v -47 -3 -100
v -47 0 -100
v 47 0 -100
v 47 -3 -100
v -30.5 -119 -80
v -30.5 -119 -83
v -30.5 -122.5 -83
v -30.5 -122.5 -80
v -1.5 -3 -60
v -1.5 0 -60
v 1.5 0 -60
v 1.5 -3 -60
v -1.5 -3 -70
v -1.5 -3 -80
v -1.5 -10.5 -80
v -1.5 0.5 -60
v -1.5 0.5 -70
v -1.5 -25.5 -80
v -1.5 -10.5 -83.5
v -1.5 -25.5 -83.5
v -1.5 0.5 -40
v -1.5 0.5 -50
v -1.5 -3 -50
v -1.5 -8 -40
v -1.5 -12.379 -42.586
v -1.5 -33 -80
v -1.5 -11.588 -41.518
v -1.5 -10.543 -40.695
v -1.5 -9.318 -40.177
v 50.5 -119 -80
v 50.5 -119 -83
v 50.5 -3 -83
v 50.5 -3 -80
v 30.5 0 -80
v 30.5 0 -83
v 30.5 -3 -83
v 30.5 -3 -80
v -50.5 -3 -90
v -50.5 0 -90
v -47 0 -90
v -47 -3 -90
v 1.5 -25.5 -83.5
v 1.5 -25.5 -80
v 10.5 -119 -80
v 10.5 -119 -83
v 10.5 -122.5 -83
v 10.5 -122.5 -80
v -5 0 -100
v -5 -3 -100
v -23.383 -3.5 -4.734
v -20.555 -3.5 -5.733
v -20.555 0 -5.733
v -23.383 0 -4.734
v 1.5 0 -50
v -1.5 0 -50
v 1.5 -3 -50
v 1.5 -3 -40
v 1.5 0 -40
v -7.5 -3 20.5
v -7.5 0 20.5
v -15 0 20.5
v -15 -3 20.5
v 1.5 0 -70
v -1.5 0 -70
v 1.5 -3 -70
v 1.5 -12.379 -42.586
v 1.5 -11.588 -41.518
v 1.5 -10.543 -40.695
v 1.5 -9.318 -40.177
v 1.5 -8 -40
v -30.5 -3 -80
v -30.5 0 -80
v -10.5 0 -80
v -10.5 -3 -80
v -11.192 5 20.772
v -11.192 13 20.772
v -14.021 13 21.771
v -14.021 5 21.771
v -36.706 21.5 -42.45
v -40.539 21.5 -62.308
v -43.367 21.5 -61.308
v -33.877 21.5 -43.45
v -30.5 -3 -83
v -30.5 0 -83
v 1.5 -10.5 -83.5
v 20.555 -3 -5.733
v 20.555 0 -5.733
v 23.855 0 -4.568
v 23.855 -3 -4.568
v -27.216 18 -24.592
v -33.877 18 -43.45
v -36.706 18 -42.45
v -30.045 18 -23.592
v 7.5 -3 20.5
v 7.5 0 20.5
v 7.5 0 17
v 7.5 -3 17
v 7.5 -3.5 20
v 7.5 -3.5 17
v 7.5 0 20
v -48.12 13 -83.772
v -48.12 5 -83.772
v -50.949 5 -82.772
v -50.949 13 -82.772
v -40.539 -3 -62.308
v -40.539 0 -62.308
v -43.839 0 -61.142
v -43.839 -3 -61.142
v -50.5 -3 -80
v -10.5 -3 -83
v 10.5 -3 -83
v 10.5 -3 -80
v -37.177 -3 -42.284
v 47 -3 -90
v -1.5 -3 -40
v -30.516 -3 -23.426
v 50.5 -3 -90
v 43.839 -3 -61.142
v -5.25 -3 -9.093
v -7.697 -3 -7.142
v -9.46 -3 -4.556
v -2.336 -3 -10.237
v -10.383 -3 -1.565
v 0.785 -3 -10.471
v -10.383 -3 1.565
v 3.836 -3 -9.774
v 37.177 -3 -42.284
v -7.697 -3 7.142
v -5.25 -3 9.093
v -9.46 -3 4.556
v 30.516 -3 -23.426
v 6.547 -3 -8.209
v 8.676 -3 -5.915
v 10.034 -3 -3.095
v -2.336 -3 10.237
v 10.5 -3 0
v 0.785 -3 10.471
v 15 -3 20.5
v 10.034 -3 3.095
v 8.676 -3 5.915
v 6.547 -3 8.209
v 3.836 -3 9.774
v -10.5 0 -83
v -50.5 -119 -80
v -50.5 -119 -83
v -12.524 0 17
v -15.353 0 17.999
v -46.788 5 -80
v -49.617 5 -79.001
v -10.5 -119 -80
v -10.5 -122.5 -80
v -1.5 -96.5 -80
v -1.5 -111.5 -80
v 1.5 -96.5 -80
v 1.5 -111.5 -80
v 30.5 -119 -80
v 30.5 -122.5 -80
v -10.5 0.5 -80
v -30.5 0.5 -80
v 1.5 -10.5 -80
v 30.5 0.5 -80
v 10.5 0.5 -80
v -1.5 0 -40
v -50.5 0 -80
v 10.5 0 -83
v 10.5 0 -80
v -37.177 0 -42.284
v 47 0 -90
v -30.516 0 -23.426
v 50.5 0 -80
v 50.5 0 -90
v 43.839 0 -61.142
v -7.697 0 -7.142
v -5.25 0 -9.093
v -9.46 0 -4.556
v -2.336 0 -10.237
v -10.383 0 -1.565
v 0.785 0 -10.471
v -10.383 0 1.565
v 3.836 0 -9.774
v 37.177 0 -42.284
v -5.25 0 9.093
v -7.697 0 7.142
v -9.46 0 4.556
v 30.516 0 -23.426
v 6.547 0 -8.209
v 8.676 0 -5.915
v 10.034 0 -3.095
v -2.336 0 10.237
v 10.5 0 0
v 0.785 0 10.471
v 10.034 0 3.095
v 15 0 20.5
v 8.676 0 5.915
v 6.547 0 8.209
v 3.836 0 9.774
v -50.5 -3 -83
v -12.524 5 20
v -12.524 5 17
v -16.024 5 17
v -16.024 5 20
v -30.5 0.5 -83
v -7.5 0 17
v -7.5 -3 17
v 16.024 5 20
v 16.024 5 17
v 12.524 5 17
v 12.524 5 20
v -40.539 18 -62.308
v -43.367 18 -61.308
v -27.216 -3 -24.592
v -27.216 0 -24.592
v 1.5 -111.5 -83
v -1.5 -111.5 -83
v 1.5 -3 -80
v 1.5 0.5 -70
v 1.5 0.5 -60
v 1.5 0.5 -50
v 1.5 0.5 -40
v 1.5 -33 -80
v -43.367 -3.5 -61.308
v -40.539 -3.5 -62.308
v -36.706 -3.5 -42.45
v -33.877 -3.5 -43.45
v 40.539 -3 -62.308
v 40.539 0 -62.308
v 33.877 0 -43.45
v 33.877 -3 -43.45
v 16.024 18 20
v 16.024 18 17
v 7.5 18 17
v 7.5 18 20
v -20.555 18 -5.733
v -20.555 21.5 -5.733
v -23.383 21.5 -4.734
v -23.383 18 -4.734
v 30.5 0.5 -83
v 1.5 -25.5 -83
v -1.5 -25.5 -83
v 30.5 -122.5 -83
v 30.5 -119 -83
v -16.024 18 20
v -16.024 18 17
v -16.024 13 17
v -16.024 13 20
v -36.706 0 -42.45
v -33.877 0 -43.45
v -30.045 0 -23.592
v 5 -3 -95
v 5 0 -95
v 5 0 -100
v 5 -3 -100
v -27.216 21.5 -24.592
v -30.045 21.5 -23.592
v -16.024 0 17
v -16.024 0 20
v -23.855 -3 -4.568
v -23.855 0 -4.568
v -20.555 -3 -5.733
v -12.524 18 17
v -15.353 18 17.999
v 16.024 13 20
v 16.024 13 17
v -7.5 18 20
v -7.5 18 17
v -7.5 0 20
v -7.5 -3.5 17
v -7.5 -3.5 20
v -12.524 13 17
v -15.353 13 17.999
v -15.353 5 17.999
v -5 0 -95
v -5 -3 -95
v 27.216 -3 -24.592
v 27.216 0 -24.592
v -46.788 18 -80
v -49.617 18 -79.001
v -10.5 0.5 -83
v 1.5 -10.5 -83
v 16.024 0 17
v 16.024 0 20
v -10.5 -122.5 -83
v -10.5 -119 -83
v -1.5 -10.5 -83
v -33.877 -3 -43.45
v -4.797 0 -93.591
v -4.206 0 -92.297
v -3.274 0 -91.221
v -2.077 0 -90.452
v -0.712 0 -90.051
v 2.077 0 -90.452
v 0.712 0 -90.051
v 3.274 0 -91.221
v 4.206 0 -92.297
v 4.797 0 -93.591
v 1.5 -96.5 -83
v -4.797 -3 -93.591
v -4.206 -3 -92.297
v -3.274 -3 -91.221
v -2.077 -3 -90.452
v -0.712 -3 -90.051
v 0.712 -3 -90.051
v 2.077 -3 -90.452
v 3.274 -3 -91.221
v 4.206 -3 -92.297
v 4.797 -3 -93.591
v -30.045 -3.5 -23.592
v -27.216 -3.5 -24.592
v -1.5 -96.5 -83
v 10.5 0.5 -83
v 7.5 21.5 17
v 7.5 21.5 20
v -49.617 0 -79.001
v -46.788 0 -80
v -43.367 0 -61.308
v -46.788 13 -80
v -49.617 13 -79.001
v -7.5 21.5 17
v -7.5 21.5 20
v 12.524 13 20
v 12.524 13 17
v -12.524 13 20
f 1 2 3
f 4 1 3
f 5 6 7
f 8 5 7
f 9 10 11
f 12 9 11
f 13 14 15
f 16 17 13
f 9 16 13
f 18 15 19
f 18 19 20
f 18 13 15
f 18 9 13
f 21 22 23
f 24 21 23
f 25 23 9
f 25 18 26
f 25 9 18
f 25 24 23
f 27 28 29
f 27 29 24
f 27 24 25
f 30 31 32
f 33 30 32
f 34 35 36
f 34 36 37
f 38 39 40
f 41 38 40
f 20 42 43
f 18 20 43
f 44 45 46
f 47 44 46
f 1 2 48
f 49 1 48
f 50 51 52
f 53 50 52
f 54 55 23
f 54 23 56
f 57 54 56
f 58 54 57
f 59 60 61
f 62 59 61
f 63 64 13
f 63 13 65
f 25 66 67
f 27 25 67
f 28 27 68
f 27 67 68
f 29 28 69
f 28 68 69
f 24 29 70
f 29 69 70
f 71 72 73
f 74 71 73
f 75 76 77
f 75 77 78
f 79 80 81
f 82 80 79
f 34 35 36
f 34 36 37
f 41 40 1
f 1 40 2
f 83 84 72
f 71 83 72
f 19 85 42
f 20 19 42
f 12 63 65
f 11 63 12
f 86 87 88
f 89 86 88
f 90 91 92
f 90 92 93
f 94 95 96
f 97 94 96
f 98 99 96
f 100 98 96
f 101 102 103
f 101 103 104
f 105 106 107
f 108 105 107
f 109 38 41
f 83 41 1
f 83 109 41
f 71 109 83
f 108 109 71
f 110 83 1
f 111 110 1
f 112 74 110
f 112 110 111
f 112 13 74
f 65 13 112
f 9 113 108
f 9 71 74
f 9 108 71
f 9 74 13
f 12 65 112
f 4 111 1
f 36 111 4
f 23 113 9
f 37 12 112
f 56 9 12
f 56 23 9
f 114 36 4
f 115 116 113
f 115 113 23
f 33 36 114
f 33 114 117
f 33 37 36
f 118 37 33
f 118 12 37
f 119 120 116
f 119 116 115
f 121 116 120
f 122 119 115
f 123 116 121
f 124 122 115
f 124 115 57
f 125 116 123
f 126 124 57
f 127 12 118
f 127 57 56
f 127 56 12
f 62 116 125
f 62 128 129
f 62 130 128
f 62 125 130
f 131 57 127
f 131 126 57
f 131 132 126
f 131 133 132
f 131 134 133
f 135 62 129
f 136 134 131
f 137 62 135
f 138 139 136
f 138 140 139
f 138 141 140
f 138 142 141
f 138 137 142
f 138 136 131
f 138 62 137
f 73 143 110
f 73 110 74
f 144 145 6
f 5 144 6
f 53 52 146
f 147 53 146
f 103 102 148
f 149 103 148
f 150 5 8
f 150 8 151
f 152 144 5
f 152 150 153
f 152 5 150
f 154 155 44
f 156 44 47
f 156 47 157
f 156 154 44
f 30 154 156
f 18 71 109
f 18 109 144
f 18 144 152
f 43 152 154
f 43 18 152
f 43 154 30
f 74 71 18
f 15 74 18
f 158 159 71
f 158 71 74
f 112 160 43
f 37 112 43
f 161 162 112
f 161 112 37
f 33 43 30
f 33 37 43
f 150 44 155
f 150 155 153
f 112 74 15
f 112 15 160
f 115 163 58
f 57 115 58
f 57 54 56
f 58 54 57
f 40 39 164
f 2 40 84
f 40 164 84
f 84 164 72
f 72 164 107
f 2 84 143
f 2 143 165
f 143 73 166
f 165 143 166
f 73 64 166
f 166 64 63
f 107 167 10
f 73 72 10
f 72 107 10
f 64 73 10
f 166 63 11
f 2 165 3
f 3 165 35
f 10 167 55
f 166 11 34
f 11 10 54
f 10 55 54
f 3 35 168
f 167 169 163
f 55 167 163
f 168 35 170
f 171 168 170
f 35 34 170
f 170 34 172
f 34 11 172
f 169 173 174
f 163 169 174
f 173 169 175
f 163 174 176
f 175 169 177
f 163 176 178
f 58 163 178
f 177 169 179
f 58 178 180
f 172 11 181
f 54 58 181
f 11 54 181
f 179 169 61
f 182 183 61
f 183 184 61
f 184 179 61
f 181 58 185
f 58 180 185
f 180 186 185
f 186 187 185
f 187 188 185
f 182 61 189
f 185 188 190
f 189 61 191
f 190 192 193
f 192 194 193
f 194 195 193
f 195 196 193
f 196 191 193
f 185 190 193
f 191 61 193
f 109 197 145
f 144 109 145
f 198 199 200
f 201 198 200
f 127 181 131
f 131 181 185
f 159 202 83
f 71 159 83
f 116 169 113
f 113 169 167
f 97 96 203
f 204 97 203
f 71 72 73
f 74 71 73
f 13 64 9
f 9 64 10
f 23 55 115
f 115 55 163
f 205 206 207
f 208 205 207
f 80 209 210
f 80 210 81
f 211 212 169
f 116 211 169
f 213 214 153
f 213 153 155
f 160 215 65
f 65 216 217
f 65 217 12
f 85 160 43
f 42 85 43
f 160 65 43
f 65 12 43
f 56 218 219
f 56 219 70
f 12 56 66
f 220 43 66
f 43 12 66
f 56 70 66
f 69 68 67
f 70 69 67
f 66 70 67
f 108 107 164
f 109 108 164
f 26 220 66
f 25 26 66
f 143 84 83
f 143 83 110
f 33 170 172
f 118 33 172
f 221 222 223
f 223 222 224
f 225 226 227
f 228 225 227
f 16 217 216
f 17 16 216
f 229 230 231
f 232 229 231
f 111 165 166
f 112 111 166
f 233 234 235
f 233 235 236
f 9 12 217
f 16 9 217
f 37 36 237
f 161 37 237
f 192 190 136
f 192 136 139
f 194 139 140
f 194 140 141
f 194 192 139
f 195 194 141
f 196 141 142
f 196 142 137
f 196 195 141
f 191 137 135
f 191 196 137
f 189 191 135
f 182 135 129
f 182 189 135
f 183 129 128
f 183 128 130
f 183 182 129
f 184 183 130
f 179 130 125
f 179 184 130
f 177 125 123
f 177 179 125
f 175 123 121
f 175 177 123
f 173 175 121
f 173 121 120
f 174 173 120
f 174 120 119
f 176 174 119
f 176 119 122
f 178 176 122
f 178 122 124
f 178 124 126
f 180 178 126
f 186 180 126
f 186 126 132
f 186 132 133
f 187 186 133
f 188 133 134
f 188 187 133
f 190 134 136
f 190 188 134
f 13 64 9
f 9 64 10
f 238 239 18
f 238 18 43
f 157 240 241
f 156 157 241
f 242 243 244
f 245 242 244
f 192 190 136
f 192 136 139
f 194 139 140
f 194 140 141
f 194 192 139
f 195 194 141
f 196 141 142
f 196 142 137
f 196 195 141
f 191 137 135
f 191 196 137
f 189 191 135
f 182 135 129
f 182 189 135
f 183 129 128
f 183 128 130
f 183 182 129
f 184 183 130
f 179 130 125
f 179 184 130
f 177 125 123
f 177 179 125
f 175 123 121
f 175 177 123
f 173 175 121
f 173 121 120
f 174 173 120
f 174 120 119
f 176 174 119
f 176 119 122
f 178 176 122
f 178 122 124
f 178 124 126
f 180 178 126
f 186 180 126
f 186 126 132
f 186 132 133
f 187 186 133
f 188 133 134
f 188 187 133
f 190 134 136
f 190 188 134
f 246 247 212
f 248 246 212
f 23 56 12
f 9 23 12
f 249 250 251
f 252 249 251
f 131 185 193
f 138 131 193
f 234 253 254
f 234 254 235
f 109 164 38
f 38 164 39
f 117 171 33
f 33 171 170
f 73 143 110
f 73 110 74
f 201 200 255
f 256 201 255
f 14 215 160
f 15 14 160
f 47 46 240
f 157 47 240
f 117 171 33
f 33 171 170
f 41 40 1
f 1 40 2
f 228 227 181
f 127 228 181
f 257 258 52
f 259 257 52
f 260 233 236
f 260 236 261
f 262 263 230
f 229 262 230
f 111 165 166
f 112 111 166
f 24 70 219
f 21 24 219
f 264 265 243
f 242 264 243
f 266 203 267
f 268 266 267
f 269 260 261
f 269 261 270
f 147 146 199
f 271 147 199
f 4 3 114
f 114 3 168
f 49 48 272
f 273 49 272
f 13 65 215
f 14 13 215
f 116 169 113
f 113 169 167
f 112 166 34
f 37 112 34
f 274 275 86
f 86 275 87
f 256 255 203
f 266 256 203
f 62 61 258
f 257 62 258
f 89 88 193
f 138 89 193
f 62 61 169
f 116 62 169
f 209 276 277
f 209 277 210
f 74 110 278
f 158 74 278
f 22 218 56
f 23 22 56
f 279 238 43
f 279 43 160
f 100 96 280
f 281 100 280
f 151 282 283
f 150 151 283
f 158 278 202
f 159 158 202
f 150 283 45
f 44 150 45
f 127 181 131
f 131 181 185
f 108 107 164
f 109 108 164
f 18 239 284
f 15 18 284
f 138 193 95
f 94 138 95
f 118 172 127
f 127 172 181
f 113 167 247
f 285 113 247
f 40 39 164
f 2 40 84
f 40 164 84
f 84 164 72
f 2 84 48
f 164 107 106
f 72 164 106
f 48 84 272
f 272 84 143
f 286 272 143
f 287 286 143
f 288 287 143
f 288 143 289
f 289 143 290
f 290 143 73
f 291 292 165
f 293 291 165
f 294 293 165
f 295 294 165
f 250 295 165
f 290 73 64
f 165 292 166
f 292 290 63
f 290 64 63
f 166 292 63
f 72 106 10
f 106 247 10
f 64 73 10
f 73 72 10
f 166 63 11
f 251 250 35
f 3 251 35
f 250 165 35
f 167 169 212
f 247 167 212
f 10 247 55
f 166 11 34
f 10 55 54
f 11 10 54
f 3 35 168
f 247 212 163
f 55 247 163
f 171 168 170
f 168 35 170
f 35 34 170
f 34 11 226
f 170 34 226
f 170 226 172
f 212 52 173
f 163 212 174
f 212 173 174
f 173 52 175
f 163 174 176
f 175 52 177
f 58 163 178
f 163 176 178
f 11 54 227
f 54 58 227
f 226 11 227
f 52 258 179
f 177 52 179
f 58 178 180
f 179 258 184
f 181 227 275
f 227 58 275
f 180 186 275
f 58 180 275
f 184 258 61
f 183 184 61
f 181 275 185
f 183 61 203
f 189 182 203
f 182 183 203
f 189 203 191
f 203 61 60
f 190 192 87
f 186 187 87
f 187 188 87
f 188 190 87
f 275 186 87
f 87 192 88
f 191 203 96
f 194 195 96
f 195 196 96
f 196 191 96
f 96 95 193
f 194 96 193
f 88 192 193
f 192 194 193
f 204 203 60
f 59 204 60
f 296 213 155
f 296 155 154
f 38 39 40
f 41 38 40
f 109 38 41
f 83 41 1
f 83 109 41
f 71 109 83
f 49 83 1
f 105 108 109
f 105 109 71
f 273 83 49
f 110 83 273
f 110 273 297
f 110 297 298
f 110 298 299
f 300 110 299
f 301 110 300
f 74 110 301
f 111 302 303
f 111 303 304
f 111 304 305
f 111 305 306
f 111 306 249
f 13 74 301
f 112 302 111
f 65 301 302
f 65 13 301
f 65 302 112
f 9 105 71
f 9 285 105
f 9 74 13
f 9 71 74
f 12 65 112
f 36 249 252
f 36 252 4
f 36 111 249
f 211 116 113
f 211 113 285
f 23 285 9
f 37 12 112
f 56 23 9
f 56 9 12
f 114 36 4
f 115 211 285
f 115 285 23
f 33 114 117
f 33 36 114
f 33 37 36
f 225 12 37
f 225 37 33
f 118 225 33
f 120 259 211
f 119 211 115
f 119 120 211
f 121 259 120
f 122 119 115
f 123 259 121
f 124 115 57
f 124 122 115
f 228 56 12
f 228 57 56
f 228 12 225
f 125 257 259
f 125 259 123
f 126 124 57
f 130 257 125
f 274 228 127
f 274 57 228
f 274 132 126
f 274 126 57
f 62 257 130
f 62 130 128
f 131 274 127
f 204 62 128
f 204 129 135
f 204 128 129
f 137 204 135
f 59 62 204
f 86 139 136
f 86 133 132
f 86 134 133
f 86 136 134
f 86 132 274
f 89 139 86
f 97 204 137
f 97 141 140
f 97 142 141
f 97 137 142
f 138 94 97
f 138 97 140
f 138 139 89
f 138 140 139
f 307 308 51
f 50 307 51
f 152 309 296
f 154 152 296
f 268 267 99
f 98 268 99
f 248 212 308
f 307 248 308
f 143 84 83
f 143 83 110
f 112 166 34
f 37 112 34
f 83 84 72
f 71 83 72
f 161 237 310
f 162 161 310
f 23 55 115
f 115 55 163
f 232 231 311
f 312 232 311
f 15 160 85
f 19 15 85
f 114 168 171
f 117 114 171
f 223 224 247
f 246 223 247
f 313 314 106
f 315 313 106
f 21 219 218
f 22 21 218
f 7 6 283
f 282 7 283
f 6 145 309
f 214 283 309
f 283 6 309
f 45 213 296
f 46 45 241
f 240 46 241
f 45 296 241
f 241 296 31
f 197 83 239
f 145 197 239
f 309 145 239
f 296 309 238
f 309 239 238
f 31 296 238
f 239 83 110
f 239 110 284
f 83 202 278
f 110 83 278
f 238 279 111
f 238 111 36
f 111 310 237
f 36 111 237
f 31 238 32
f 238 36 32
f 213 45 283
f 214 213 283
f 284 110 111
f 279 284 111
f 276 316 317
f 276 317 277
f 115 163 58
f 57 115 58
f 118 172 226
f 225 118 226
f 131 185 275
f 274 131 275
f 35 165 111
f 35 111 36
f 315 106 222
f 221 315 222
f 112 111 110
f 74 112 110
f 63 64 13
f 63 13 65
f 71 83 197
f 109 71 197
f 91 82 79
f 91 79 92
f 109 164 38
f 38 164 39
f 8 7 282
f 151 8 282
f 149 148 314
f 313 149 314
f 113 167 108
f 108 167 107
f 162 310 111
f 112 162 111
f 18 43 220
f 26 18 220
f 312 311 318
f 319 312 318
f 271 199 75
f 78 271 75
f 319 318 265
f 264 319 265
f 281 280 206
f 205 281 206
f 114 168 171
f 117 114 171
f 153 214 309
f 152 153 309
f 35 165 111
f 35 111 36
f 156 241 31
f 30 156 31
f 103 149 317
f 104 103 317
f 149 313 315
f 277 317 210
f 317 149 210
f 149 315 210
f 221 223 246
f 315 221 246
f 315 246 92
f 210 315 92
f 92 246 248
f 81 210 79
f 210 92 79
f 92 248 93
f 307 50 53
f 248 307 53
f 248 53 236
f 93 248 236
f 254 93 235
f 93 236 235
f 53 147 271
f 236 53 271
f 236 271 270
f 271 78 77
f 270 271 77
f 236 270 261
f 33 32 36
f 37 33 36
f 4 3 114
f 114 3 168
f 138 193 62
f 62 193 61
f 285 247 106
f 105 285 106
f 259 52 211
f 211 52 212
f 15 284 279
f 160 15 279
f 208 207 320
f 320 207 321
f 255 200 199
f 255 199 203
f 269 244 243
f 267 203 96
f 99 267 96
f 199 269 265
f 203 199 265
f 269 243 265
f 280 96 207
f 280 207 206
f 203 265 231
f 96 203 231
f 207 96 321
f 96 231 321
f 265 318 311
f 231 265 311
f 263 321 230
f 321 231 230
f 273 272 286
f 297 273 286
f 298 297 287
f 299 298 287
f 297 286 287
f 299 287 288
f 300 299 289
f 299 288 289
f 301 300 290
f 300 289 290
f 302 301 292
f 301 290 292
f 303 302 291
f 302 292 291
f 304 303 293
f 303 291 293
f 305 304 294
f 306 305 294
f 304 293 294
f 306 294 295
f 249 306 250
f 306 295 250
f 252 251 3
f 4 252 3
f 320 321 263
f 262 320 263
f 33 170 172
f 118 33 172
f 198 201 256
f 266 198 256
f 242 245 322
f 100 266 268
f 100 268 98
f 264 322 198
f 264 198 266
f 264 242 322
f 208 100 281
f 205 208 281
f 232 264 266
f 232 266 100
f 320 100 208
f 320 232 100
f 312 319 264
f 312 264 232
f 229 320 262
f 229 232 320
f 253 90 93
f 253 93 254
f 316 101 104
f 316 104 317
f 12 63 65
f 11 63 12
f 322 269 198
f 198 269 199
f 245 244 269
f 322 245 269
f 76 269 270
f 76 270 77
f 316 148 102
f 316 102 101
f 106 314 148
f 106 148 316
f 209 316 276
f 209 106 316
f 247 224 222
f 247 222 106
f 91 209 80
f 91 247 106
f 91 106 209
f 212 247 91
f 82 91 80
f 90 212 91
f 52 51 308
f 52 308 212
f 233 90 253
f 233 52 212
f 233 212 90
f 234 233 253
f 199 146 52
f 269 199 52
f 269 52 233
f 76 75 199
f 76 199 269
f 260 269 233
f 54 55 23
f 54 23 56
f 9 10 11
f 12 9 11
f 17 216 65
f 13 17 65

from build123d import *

# Parameters (mm, degrees)
F0_W      = 20
F0_H      = 3
F0_W_2    = 3
F0_H_2    = 10
F0_R      = 10.5
F1_DEPTH  = 3
F0_W_3    = 15
F0_H_3    = 3.5
F2_DEPTH  = 3
F4_DEPTH  = 3
F6_DEPTH  = 3
F8_DEPTH  = 3
F9_W      = 3
F9_H      = 15
F10_DEPTH = 3


# Not quite as in the source:
# - a pattern or mirror of a feature is missing from the dataset's text; its kind, count and spacing are read off the source's solid


with BuildPart() as f1:
    # F0 (on Front) → F1 (new body)
    with BuildSketch(Plane.XZ):
        with BuildLine():
            Line((23.8547611875, -4.5677042069), (15, 20.5))
            Line((15, 20.5), (7.5, 20.5))
            Line((7.5, 20.5), (7.5, 17))
            Line((7.5, 17), (-7.5, 17))
            Line((-7.5, 17), (-7.5, 20.5))
            Line((-7.5, 20.5), (-15, 20.5))
            Line((-15, 20.5), (-23.8547611875, -4.5677042069))
            Line((-23.8547611875, -4.5677042069), (-20.5545982465, -5.7334334049))
            Line((-20.5545982465, -5.7334334049), (-27.2159079497, -24.5915073532))
            Line((-27.2159079497, -24.5915073532), (-30.5160708906, -23.4257781551))
            Line((-30.5160708906, -23.4257781551), (-37.1773805937, -42.2838521034))
            Line((-37.1773805937, -42.2838521034), (-33.8772176528, -43.4495813015))
            Line((-33.8772176528, -43.4495813015), (-40.5385273559, -62.3076552498))
            Line((-40.5385273559, -62.3076552498), (-43.8386902969, -61.1419260517))
            Line((-43.8386902969, -61.1419260517), (-50.5, -80))
            Line((-50.5, -80), (-50.5, -90))
            Line((-50.5, -90), (-47, -90))
            Line((-47, -90), (-47, -100))
            Line((-47, -100), (-5, -100))
            Line((-5, -100), (-5, -95))
            ThreePointArc((-5, -95), (0, -90), (5, -95))
            Line((5, -95), (5, -100))
            Line((5, -100), (47, -100))
            Line((47, -100), (47, -90))
            Line((47, -90), (50.5, -90))
            Line((50.5, -90), (50.5, -80))
            Line((50.5, -80), (43.8386902969, -61.1419260517))
            Line((43.8386902969, -61.1419260517), (40.5385273559, -62.3076552498))
            Line((40.5385273559, -62.3076552498), (33.8772176528, -43.4495813015))
            Line((33.8772176528, -43.4495813015), (37.1773805937, -42.2838521034))
            Line((37.1773805937, -42.2838521034), (30.5160708906, -23.4257781551))
            Line((30.5160708906, -23.4257781551), (27.2159079497, -24.5915073532))
            Line((27.2159079497, -24.5915073532), (20.5545982465, -5.7334334049))
            Line((20.5545982465, -5.7334334049), (23.8547611875, -4.5677042069))
        make_face()
        with Locations((-20.5, -81.5)):
            Rectangle(F0_W, F0_H, mode=Mode.SUBTRACT)
        with Locations((20.5, -81.5)):
            Rectangle(F0_W, F0_H, mode=Mode.SUBTRACT)
        with Locations((0, -65)):
            Rectangle(F0_W_2, F0_H_2, mode=Mode.SUBTRACT)
        with Locations((0, -45)):
            Rectangle(F0_W_2, F0_H_2, mode=Mode.SUBTRACT)
        Circle(F0_R, mode=Mode.SUBTRACT)
    extrude(amount=F1_DEPTH)


with BuildPart() as f2:
    # F0 (on Front) → F2 (new body)
    with BuildSketch(Plane.XZ):
        with BuildLine():
            Line((23.8547611875, -4.5677042069), (15, 20.5))
            Line((15, 20.5), (7.5, 20.5))
            Line((7.5, 20.5), (7.5, 17))
            Line((7.5, 17), (-7.5, 17))
            Line((-7.5, 17), (-7.5, 20.5))
            Line((-7.5, 20.5), (-15, 20.5))
            Line((-15, 20.5), (-23.8547611875, -4.5677042069))
            Line((-23.8547611875, -4.5677042069), (-20.5545982465, -5.7334334049))
            Line((-20.5545982465, -5.7334334049), (-27.2159079497, -24.5915073532))
            Line((-27.2159079497, -24.5915073532), (-30.5160708906, -23.4257781551))
            Line((-30.5160708906, -23.4257781551), (-37.1773805937, -42.2838521034))
            Line((-37.1773805937, -42.2838521034), (-33.8772176528, -43.4495813015))
            Line((-33.8772176528, -43.4495813015), (-40.5385273559, -62.3076552498))
            Line((-40.5385273559, -62.3076552498), (-43.8386902969, -61.1419260517))
            Line((-43.8386902969, -61.1419260517), (-50.5, -80))
            Line((-50.5, -80), (-50.5, -90))
            Line((-50.5, -90), (-47, -90))
            Line((-47, -90), (-47, -100))
            Line((-47, -100), (-5, -100))
            Line((-5, -100), (-5, -95))
            ThreePointArc((-5, -95), (0, -90), (5, -95))
            Line((5, -95), (5, -100))
            Line((5, -100), (47, -100))
            Line((47, -100), (47, -90))
            Line((47, -90), (50.5, -90))
            Line((50.5, -90), (50.5, -80))
            Line((50.5, -80), (43.8386902969, -61.1419260517))
            Line((43.8386902969, -61.1419260517), (40.5385273559, -62.3076552498))
            Line((40.5385273559, -62.3076552498), (33.8772176528, -43.4495813015))
            Line((33.8772176528, -43.4495813015), (37.1773805937, -42.2838521034))
            Line((37.1773805937, -42.2838521034), (30.5160708906, -23.4257781551))
            Line((30.5160708906, -23.4257781551), (27.2159079497, -24.5915073532))
            Line((27.2159079497, -24.5915073532), (20.5545982465, -5.7334334049))
            Line((20.5545982465, -5.7334334049), (23.8547611875, -4.5677042069))
        make_face()
        with Locations((-20.5, -81.5)):
            Rectangle(F0_W, F0_H, mode=Mode.SUBTRACT)
        with Locations((20.5, -81.5)):
            Rectangle(F0_W, F0_H, mode=Mode.SUBTRACT)
        with Locations((0, -65)):
            Rectangle(F0_W_2, F0_H_2, mode=Mode.SUBTRACT)
        with Locations((0, -45)):
            Rectangle(F0_W_2, F0_H_2, mode=Mode.SUBTRACT)
        Circle(F0_R, mode=Mode.SUBTRACT)
        Polygon((30.5160708906, -23.4257781551), (23.8547611875, -4.5677042069), (20.5545982465, -5.7334334049), (27.2159079497, -24.5915073532), align=None)
        with Locations((0, 18.75)):
            Rectangle(F0_W_3, F0_H_3)
        Polygon((43.8386902969, -61.1419260517), (37.1773805937, -42.2838521034), (33.8772176528, -43.4495813015), (40.5385273559, -62.3076552498), align=None)
        Polygon((-20.5545982465, -5.7334334049), (-23.8547611875, -4.5677042069), (-30.5160708906, -23.4257781551), (-27.2159079497, -24.5915073532), align=None)
        Polygon((-33.8772176528, -43.4495813015), (-37.1773805937, -42.2838521034), (-43.8386902969, -61.1419260517), (-40.5385273559, -62.3076552498), align=None)
        with BuildLine():
            Line((-5, -100), (5, -100))
            Line((5, -100), (5, -95))
            ThreePointArc((5, -95), (0, -90), (-5, -95))
            Line((-5, -95), (-5, -100))
        make_face()
    extrude(amount=F2_DEPTH)


with BuildPart() as f4:
    # F3 (on face) → F4 (new body)
    with BuildSketch(Plane(origin=(-16.4738456854, 0, 5.8191196202), x_dir=(0, -1, 0), z_dir=(-0.9429036974, 0, 0.3330654852))):
        Polygon((0, 11.8579239963), (-5, 11.8579239963), (-5, 15.8579239963), (-9, 15.8579239963), (-9, -95.0157843856), (-5, -95.0157843856), (-5, -91.0157843856), (0, -91.0157843856), (0, -72.2521027935), (3.5, -72.2521027935), (3.5, -52.2521027935), (0, -52.2521027935), (0, -32.2521027935), (3.5, -32.2521027935), (3.5, -12.2521027935), (0, -12.2521027935), align=None)
    extrude(amount=F4_DEPTH)

    # F4_copies: F4 across plane


with BuildPart() as f4_1:
    add(f4.part)
    add(f4.part.mirror(Plane.ZX.offset(9)))


with BuildPart() as f6:
    # F5 (on face) → F6 (new body)
    with BuildSketch(Plane.XY.offset(17)):
        Polygon((-16.0243804767, 0), (-7.5, 0), (-7.5, -3.5), (7.5, -3.5), (7.5, 0), (16.0243804767, 0), (16.0243804767, 5), (12.5243804767, 5), (12.5243804767, 13), (16.0243804767, 13), (16.0243804767, 18), (7.5, 18), (7.5, 21.5), (-7.5, 21.5), (-7.5, 18), (-16.0243804767, 18), (-16.0243804767, 13), (-12.5243804767, 13), (-12.5243804767, 5), (-16.0243804767, 5), align=None)
    extrude(amount=F6_DEPTH)


with BuildPart() as f8:
    # F7 (on face) → F8 (new body)
    with BuildSketch(Plane(origin=(1.5, 0, 0), x_dir=(0, -1, 0), z_dir=(-1, 0, 0))):
        with BuildLine():
            ThreePointArc((12.3789206904, -42.5864852212), (10.5428749582, -40.6949115053), (8, -40))
            Line((8, -40), (-0.5, -40))
            Line((-0.5, -40), (-0.5, -50))
            Line((-0.5, -50), (3, -50))
            Line((3, -50), (3, -60))
            Line((3, -60), (-0.5, -60))
            Line((-0.5, -60), (-0.5, -70))
            Line((-0.5, -70), (3, -70))
            Line((3, -70), (3, -80))
            Line((3, -80), (10.5, -80))
            Line((10.5, -80), (10.5, -83.5))
            Line((10.5, -83.5), (25.5, -83.5))
            Line((25.5, -83.5), (25.5, -80))
            Line((25.5, -80), (33, -80))
            Line((33, -80), (12.3789206904, -42.5864852212))
        make_face()
    extrude(amount=F8_DEPTH)


with BuildPart() as f10:
    # F9 (on face) → F10 (new body)
    with BuildSketch(Plane.XY.offset(-83)):
        Polygon((-30.5, -3), (-50.5, -3), (-50.5, -119), (-30.5, -119), (-30.5, -122.5), (-10.5, -122.5), (-10.5, -119), (10.5, -119), (10.5, -122.5), (30.5, -122.5), (30.5, -119), (50.5, -119), (50.5, -3), (30.5, -3), (30.5, 0.5), (10.5, 0.5), (10.5, -3), (-10.5, -3), (-10.5, 0.5), (-30.5, 0.5), align=None)
        with Locations((0, -104)):
            Rectangle(F9_W, F9_H, mode=Mode.SUBTRACT)
        with Locations((0, -18)):
            Rectangle(F9_W, F9_H, mode=Mode.SUBTRACT)
    extrude(amount=F10_DEPTH)


solid = Compound([f1.part, f2.part, f4_1.part, f6.part, f8.part, f10.part])
